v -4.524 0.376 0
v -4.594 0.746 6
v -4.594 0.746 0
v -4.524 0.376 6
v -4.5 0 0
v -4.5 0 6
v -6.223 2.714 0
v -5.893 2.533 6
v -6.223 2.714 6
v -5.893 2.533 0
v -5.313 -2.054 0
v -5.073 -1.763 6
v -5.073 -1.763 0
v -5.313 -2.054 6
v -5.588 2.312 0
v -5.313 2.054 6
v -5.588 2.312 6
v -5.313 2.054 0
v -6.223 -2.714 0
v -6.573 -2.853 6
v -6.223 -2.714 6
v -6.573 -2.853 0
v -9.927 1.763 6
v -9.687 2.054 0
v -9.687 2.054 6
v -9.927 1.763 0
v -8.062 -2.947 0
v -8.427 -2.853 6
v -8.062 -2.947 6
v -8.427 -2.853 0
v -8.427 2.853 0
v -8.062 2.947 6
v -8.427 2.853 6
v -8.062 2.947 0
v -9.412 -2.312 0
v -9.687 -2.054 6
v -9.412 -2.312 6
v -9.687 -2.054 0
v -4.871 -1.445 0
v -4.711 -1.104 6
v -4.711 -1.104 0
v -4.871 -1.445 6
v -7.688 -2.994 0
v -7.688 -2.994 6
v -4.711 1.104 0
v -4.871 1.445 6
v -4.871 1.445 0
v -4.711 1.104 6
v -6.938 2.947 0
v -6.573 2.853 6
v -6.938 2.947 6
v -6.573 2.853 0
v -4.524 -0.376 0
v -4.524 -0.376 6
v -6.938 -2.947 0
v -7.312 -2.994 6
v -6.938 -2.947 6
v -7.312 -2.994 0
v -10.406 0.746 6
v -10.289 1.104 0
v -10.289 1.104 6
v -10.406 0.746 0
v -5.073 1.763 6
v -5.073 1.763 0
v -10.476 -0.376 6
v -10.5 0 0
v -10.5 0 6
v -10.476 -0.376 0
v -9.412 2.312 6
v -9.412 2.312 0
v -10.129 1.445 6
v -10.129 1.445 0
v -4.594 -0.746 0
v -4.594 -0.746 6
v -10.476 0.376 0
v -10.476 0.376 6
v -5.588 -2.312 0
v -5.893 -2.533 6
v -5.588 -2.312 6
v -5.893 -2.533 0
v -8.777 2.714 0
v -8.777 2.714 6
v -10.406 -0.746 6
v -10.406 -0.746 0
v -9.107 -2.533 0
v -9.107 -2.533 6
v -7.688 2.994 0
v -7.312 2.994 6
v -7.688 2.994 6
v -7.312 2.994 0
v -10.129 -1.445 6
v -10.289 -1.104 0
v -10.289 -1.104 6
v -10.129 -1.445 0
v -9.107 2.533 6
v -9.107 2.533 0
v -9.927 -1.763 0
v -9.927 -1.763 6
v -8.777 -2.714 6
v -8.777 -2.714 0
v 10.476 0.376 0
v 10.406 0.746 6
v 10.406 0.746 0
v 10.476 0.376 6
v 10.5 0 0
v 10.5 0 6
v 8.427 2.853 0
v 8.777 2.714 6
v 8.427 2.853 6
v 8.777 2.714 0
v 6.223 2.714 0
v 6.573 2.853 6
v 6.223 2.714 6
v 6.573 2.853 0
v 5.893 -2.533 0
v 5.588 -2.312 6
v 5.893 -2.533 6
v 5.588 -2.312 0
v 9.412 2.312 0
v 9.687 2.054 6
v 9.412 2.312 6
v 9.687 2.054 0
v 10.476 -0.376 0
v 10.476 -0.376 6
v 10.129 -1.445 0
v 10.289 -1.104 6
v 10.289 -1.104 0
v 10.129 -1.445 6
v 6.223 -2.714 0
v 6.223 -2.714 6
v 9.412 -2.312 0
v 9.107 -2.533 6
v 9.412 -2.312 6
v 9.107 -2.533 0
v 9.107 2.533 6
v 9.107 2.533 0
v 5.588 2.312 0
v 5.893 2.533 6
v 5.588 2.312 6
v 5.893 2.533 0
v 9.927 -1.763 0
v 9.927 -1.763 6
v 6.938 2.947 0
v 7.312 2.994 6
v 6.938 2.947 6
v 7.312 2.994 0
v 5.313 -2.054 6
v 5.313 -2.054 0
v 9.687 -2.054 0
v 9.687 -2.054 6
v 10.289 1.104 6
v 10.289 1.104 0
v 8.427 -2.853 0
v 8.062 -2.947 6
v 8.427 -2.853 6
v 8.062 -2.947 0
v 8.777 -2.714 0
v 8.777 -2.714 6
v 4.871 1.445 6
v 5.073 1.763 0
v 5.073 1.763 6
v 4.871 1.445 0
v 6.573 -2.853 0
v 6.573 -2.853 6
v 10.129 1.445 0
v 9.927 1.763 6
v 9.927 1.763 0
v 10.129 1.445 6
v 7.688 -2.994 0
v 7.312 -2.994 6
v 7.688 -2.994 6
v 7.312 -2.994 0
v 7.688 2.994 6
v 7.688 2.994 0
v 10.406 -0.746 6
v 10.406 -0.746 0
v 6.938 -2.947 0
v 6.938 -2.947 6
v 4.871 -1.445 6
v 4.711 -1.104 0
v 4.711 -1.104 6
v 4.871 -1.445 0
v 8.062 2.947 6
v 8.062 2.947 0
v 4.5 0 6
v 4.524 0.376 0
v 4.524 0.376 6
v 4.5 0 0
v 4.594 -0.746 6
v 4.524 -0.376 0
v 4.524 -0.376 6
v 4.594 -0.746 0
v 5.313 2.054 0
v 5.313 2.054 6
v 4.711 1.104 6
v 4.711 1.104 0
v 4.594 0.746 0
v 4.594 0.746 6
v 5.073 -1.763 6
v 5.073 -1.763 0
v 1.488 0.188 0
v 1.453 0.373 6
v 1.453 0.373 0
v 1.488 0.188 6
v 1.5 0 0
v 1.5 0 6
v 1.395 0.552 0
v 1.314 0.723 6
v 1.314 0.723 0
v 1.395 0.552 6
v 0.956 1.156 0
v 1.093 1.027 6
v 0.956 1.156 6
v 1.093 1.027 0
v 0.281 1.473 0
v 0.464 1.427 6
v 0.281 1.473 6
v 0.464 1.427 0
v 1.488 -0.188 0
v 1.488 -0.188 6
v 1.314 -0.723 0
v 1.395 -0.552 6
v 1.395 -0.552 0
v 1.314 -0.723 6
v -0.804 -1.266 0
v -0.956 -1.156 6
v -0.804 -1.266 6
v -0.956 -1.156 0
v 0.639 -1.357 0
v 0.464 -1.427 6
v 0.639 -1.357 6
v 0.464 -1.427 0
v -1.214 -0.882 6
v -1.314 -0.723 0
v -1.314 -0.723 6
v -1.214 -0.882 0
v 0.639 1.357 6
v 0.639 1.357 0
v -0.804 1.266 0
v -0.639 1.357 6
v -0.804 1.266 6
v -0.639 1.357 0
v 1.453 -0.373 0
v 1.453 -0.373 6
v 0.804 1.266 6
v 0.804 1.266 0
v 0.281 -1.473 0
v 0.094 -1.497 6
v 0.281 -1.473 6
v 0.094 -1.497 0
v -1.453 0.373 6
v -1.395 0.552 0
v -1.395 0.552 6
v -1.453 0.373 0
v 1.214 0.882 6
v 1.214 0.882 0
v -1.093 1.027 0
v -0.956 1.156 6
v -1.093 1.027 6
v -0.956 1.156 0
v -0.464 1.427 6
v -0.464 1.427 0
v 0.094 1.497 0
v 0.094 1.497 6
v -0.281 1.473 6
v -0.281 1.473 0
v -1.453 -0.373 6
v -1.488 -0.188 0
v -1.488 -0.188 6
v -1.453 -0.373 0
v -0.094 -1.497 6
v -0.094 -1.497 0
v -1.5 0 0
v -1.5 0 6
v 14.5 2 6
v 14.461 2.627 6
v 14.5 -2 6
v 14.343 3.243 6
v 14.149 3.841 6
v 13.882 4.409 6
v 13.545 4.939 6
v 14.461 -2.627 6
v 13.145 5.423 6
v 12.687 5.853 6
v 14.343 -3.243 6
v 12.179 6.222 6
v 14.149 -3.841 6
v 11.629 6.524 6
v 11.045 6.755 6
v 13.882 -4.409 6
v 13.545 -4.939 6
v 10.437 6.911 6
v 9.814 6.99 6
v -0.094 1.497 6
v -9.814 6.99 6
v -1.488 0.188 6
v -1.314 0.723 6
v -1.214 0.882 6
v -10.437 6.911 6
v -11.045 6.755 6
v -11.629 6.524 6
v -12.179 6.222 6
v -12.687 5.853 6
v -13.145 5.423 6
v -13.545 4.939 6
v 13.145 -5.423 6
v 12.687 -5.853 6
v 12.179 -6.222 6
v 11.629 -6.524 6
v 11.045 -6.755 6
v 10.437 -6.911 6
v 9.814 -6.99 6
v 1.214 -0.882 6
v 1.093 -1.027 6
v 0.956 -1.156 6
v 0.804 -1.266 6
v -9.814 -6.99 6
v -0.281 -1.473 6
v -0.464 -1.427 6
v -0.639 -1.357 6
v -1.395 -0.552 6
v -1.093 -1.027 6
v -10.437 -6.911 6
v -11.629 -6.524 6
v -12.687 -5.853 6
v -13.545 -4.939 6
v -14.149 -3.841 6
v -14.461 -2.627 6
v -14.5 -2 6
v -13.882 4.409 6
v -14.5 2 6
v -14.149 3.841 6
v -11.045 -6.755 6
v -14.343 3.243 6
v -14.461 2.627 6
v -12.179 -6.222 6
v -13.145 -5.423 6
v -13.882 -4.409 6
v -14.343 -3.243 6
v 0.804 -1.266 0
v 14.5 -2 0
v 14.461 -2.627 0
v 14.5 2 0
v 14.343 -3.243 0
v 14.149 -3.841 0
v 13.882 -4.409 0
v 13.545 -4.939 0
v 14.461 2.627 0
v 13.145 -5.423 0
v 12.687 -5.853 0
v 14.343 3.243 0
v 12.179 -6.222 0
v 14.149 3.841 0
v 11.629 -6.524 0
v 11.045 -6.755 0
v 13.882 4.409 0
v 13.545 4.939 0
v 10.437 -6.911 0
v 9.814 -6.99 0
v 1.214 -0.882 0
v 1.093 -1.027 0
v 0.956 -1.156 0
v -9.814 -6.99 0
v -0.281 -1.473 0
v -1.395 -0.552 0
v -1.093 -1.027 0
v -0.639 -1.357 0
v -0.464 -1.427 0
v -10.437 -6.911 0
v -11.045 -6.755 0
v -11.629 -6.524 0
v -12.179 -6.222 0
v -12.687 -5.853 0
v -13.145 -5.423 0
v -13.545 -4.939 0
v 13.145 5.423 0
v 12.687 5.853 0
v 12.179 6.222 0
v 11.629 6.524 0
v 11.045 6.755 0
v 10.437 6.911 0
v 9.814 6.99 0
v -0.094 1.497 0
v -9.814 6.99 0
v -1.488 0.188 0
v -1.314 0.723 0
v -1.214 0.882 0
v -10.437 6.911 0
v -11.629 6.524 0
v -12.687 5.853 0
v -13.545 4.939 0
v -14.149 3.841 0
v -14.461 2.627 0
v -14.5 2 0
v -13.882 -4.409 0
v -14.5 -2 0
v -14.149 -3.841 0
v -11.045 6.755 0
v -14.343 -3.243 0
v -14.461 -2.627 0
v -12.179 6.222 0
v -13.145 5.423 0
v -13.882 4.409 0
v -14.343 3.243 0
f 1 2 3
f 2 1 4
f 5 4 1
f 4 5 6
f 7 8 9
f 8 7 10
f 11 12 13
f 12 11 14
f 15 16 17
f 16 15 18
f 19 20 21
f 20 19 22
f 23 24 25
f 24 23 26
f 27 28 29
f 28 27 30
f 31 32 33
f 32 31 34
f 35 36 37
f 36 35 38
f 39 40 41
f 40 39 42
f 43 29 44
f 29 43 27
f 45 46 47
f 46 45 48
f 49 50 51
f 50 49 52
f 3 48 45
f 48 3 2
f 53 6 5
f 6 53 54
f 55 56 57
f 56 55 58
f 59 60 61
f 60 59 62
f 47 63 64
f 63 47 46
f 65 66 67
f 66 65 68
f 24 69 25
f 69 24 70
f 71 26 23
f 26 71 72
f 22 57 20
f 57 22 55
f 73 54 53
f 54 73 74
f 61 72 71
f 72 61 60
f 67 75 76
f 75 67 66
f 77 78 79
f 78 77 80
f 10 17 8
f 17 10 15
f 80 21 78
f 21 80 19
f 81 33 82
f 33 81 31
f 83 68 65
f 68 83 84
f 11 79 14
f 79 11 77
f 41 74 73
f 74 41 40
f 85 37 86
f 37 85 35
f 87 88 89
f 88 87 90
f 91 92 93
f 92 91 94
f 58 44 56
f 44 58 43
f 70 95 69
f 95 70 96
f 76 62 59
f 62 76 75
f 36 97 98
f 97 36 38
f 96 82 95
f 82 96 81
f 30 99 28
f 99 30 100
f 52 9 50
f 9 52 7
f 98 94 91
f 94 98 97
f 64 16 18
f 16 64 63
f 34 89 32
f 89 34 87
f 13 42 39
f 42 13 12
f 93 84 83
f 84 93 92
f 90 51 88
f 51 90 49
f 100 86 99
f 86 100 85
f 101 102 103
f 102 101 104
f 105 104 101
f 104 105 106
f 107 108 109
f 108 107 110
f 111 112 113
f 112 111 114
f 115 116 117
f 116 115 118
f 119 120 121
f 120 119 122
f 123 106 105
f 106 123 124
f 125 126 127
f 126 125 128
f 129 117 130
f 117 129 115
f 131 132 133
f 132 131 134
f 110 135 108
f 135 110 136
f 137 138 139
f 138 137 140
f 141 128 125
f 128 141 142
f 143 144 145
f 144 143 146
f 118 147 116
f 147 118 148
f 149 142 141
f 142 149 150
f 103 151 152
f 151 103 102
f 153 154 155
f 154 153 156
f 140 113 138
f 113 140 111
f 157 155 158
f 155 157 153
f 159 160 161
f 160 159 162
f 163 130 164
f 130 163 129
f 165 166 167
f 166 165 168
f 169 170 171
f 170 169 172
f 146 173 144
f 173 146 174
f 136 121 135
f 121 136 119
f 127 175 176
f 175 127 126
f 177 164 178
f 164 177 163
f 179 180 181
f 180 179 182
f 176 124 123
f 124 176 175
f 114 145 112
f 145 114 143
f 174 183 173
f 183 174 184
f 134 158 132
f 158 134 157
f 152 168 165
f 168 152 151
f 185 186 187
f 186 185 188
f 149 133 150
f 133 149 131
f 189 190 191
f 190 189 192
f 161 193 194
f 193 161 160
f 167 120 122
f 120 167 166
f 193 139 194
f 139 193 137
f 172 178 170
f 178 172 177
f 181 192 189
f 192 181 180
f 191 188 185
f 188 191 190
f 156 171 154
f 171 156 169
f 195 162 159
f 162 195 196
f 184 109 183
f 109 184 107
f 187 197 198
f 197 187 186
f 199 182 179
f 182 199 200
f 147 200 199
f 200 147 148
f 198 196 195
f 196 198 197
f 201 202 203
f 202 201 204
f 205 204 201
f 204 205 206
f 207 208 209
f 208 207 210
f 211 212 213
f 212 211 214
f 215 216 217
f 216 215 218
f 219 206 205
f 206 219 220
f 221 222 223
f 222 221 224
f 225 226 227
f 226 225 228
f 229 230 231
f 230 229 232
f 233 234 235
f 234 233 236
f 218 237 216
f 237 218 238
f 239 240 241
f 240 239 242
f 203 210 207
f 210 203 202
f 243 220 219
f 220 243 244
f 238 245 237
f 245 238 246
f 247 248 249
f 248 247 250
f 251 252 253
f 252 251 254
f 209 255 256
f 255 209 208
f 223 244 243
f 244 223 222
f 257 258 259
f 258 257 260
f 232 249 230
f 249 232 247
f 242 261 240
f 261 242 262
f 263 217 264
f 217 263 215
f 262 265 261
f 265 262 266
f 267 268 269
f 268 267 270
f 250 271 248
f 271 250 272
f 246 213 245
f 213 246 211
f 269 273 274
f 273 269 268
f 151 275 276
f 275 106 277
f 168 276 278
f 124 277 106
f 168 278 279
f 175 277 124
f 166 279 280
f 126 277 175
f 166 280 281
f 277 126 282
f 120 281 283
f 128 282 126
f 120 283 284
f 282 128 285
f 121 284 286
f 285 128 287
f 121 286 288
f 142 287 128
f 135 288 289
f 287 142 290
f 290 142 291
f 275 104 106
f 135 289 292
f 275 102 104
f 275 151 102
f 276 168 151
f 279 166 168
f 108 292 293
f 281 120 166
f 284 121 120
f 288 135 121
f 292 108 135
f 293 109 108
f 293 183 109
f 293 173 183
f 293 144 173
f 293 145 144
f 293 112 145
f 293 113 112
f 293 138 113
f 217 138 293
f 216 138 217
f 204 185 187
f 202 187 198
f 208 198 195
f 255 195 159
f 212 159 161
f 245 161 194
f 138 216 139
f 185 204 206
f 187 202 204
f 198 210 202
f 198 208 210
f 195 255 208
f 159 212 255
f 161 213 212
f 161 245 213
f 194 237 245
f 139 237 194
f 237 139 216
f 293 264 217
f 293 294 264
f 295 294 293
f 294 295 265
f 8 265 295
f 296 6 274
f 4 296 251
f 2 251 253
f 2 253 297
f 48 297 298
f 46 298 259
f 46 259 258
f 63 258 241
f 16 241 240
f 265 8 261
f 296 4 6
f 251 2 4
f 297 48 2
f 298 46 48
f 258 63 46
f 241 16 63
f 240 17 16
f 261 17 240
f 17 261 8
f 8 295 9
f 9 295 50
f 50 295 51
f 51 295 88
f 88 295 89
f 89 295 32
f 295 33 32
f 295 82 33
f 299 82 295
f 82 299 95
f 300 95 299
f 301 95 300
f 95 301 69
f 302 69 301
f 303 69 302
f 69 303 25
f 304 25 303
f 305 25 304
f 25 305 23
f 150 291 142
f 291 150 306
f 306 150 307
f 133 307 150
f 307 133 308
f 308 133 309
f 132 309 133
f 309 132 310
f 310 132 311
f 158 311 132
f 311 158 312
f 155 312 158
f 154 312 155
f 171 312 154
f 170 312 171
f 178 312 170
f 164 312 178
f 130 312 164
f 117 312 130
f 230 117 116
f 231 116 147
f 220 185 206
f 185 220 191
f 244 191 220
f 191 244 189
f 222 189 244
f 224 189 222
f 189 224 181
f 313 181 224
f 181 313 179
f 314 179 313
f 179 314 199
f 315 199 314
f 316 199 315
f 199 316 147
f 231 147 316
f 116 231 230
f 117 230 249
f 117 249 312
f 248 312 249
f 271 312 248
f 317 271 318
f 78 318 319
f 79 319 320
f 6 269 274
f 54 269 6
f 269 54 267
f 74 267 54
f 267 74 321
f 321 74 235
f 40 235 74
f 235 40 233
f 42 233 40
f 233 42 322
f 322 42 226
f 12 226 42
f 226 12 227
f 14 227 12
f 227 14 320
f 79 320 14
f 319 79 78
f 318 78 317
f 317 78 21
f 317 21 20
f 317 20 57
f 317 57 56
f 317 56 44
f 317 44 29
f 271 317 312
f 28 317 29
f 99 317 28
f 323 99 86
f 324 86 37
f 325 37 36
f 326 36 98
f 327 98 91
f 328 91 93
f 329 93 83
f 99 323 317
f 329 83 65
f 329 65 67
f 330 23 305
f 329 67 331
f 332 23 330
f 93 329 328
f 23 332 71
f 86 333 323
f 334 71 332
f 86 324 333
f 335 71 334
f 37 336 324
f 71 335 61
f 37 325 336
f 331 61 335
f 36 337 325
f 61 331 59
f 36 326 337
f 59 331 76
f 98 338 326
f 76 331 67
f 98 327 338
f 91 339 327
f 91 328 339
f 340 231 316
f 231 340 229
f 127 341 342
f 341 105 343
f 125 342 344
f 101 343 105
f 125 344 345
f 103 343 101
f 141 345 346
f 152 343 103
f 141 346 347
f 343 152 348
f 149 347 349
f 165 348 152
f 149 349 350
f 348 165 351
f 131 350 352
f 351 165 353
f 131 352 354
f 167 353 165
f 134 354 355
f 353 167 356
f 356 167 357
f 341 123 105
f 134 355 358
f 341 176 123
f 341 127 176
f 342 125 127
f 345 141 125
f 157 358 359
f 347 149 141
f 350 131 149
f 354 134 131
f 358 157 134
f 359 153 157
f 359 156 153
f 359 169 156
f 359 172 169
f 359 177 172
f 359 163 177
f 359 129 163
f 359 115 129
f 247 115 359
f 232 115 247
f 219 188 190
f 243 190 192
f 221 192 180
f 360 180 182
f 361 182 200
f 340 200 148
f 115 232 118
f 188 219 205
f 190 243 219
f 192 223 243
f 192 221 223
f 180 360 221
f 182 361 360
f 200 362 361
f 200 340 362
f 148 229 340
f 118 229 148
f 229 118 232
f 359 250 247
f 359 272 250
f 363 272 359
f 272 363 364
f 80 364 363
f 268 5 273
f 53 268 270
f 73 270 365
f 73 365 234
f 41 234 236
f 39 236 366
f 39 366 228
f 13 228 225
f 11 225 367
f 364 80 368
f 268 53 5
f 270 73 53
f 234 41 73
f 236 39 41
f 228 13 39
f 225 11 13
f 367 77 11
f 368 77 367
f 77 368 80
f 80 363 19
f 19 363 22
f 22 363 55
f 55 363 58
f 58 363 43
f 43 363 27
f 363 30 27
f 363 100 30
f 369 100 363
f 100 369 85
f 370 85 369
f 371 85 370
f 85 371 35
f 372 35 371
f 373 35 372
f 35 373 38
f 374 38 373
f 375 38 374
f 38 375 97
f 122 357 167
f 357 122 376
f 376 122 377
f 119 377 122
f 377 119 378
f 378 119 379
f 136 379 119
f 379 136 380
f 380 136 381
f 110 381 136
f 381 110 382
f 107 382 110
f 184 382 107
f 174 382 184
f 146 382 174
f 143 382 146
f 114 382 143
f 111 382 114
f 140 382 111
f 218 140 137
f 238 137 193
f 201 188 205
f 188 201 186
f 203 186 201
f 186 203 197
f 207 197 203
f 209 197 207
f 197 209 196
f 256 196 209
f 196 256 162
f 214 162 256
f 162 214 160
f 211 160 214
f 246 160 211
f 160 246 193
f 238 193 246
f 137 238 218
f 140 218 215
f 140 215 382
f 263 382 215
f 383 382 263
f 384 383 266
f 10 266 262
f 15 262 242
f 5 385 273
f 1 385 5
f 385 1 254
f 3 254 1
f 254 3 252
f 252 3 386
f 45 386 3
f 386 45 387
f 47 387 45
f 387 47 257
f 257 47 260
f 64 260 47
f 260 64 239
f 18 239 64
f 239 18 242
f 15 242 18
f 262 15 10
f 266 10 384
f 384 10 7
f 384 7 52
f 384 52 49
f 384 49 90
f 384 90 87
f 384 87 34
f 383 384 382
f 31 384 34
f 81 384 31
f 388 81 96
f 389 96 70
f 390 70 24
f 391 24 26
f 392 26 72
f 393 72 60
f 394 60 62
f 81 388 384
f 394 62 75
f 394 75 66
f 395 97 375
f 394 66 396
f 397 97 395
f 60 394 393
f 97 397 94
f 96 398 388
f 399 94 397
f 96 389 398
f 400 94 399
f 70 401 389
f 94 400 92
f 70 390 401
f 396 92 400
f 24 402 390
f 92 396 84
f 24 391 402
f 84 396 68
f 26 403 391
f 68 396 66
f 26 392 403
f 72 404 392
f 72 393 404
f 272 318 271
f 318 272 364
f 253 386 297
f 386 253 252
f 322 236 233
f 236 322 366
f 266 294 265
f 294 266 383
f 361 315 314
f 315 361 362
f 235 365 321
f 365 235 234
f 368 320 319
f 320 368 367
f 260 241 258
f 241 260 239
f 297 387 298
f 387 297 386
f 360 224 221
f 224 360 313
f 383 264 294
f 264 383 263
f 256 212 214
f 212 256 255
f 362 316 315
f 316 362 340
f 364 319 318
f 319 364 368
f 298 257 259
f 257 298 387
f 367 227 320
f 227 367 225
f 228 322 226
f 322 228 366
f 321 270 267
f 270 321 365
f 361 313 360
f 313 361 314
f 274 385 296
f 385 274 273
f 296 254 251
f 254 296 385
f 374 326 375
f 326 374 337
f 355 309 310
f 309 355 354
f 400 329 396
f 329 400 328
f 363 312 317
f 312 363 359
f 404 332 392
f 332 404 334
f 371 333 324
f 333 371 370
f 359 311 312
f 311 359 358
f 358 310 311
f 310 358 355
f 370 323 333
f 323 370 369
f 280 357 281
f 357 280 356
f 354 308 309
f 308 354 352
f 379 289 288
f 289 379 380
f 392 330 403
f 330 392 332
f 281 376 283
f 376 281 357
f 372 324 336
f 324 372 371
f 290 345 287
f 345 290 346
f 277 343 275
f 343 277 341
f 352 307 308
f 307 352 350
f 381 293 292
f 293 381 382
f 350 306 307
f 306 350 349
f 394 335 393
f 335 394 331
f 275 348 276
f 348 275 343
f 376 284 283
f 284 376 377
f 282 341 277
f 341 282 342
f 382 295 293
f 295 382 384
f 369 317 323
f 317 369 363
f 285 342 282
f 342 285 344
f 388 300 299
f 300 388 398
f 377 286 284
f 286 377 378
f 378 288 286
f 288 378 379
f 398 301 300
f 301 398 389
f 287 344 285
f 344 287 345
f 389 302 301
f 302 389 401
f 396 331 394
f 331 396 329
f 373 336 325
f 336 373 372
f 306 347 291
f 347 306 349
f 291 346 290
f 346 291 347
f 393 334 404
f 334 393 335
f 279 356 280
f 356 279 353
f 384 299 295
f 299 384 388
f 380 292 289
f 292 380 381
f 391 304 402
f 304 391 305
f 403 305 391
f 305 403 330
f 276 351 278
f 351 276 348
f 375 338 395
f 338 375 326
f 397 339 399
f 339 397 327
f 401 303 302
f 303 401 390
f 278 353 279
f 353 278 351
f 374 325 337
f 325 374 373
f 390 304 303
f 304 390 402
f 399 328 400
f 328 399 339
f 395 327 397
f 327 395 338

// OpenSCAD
$fn = 50;


difference() {
	union() {
		hull() {
			translate(v = [-9.5000000000, 2.0000000000, 0]) {
				cylinder(h = 6, r = 5);
			}
			translate(v = [9.5000000000, 2.0000000000, 0]) {
				cylinder(h = 6, r = 5);
			}
			translate(v = [-9.5000000000, -2.0000000000, 0]) {
				cylinder(h = 6, r = 5);
			}
			translate(v = [9.5000000000, -2.0000000000, 0]) {
				cylinder(h = 6, r = 5);
			}
		}
	}
	union() {
		translate(v = [-7.5000000000, 0.0000000000, -100.0000000000]) {
			cylinder(h = 200, r = 3.0000000000);
		}
		translate(v = [7.5000000000, 0.0000000000, -100.0000000000]) {
			cylinder(h = 200, r = 3.0000000000);
		}
		translate(v = [-7.5000000000, 0.0000000000, 0]) {
			cylinder(h = 6, r = 1.5000000000);
		}
		cylinder(h = 6, r = 1.5000000000);
		translate(v = [7.5000000000, 0.0000000000, 0]) {
			cylinder(h = 6, r = 1.5000000000);
		}
		translate(v = [-7.5000000000, 0.0000000000, 0]) {
			cylinder(h = 6, r = 1.5000000000);
		}
		cylinder(h = 6, r = 1.5000000000);
		translate(v = [7.5000000000, 0.0000000000, 0]) {
			cylinder(h = 6, r = 1.5000000000);
		}
		translate(v = [-7.5000000000, 0.0000000000, 0]) {
			cylinder(h = 6, r = 1.5000000000);
		}
		cylinder(h = 6, r = 1.5000000000);
		translate(v = [7.5000000000, 0.0000000000, 0]) {
			cylinder(h = 6, r = 1.5000000000);
		}
	}
}
